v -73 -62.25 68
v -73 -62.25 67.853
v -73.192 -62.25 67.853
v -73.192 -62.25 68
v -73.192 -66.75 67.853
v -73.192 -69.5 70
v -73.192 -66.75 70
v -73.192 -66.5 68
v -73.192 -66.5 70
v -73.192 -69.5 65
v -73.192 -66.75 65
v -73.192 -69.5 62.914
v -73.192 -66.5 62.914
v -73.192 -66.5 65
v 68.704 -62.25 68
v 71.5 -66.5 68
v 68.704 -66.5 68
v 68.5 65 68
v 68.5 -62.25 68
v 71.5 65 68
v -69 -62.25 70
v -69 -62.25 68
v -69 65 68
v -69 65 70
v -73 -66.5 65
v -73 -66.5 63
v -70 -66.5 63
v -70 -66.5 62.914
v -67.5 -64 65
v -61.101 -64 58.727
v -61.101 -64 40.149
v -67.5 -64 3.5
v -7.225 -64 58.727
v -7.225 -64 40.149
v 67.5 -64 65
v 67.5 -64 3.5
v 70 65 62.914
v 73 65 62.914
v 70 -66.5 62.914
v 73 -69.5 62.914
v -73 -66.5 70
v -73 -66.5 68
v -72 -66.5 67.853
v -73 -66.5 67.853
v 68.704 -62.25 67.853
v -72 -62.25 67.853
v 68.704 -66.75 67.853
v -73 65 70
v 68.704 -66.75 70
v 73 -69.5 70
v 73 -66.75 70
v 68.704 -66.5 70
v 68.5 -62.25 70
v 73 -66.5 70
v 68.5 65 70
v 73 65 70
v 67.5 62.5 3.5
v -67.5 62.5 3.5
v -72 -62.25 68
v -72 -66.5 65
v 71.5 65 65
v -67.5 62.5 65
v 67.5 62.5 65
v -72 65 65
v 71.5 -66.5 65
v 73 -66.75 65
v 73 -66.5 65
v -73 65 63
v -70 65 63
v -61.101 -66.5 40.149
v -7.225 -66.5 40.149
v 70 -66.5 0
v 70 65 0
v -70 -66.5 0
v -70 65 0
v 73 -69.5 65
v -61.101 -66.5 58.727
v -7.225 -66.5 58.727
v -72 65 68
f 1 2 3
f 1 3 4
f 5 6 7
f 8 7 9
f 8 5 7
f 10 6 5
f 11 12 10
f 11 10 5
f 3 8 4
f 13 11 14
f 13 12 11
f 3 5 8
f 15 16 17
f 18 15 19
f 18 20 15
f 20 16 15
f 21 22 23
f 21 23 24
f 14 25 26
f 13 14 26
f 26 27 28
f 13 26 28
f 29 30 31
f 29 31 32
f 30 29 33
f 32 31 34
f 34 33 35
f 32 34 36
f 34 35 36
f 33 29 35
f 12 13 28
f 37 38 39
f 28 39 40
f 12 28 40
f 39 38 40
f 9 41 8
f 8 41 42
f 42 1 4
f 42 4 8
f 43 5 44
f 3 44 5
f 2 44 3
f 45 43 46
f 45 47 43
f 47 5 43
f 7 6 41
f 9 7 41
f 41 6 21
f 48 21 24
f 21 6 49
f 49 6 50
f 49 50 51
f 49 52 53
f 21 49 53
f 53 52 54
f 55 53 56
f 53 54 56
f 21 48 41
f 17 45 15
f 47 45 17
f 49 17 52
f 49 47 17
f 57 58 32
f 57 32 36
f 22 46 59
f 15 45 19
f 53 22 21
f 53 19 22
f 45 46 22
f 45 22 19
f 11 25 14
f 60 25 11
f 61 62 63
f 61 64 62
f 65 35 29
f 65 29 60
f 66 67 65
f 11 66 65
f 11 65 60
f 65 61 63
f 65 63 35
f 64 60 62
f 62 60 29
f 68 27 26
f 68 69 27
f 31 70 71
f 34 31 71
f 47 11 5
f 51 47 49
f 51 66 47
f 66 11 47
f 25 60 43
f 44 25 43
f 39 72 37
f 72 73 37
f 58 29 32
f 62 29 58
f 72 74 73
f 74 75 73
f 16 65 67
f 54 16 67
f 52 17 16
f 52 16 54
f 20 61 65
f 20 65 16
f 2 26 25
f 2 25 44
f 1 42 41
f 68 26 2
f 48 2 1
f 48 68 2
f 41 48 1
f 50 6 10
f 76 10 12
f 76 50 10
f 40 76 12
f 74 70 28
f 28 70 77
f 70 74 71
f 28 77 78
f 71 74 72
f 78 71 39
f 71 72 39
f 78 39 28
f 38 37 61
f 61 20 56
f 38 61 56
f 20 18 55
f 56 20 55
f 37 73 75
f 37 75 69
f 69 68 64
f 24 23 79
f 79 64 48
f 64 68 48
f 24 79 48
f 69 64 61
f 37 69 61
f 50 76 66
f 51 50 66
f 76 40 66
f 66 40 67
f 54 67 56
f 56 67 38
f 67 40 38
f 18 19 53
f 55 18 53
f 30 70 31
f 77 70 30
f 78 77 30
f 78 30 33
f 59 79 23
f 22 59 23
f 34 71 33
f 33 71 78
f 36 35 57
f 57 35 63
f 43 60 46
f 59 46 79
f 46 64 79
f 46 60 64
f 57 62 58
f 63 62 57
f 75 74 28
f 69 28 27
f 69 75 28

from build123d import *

# Parameters (mm, degrees)
F0_W      = 140
F0_H      = 130
F1_DEPTH  = 65
F2_W      = 138
F2_H      = 128
F3_DEPTH  = 63
F4_W      = 60
F4_H      = 20
F5_DEPTH  = 25
F7_W      = 130
F7_H      = 2.0862916112
F8_DEPTH  = 3
F9_W      = 1.5
F9_H      = 130
F10_DEPTH = 5
F11_W     = 130
F11_H     = 2
F12_DEPTH = 3
F13_W     = 130
F13_H     = 2
F14_DEPTH = 3
F15_W     = 1
F15_H     = 130
F16_DEPTH = 5
F17_W     = 130
F17_H     = 2
F18_DEPTH = 3
F19_DEPTH = 1.5
F20_DEPTH = 1.5
F21_DEPTH = 1.5
F22_DEPTH = 1.5
F23_DEPTH = 1.5
F25_DEPTH = 3
F26_W     = 80.1923086047
F26_H     = 2.75
F27_DEPTH = 5
F28_W     = 75.8964964747
F28_H     = 2.1470558643
F29_DEPTH = 4.5
F30_W     = 59.895
F30_H     = 4
F31_DEPTH = 3
F32_DEPTH = 62
F33_W     = 53.8761485368
F33_H     = 18.5779780149
F34_DEPTH = 3
F35_DEPTH = 4


with BuildPart() as f1:
    # F0 (on Top) → F1 (new body)
    with BuildSketch(Plane.XY):
        Rectangle(F0_W, F0_H)
    extrude(amount=F1_DEPTH)

    # F2 (on face) → F3 (cut)
    with BuildSketch(Plane.XY.offset(65)):
        Rectangle(F2_W, F2_H)
    extrude(amount=-F3_DEPTH, mode=Mode.SUBTRACT)

    # F4 (on face) → F5 (cut)
    with BuildSketch(Plane.XZ.offset(65)):
        with Locations((-37.1923086047, 55)):
            Rectangle(F4_W, F4_H)
    extrude(amount=-F5_DEPTH, mode=Mode.SUBTRACT)

    # F7 (on face) → F8 (join)
    with BuildSketch(Plane.YZ.offset(70)):
        with Locations((0, 63.9568541944)):
            Rectangle(F7_W, F7_H)
    extrude(amount=F8_DEPTH)

    # F9 (on face) → F10 (join)
    with BuildSketch(Plane.XY.offset(65)):
        with Locations((72.25, 0)):
            Rectangle(F9_W, F9_H)
    extrude(amount=F10_DEPTH)

    # F11 (on face) → F12 (join)
    with BuildSketch(Plane(origin=(71.5, 0, 0), x_dir=(0, -1, 0), z_dir=(-1, 0, 0))):
        with Locations((0, 69)):
            Rectangle(F11_W, F11_H)
    extrude(amount=F12_DEPTH)

    # F13 (on face) → F14 (join)
    with BuildSketch(Plane(origin=(-70, 0, 0), x_dir=(0, -1, 0), z_dir=(-1, 0, 0))):
        with Locations((0, 64)):
            Rectangle(F13_W, F13_H)
    extrude(amount=F14_DEPTH)

    # F15 (on face) → F16 (join)
    with BuildSketch(Plane.XY.offset(65)):
        with Locations((-72.5, 0)):
            Rectangle(F15_W, F15_H)
    extrude(amount=F16_DEPTH)

    # F17 (on face) → F18 (join)
    with BuildSketch(Plane.YZ.offset(-72)):
        with Locations((0, 69)):
            Rectangle(F17_W, F17_H)
    extrude(amount=F18_DEPTH)

    # F19 (add): a face of the model
    f19_faces = [f1.faces().sort_by_distance(p)[0] for p in [
        (5.6478539393, -65, 29.2570369854),
    ]]
    extrude(f19_faces, amount=F19_DEPTH)

    # F20 (add): a face of the model
    f20_faces = [f1.faces().sort_by_distance(p)[0] for p in [
        (0, 64, 33.5),
    ]]
    extrude(f20_faces, amount=F20_DEPTH)

    # F21 (add): a face of the model
    f21_faces = [f1.faces().sort_by_distance(p)[0] for p in [
        (-69, -0.75, 33.5),
    ]]
    extrude(f21_faces, amount=F21_DEPTH)

    # F22 (add): a face of the model
    f22_faces = [f1.faces().sort_by_distance(p)[0] for p in [
        (0.75, -0.75, 2),
    ]]
    extrude(f22_faces, amount=F22_DEPTH)

    # F23 (add): a face of the model
    f23_faces = [f1.faces().sort_by_distance(p)[0] for p in [
        (69, -0.75, 34.25),
    ]]
    extrude(f23_faces, amount=F23_DEPTH)

    # F24 (on face) → F25 (join)
    with BuildSketch(Plane.XZ.offset(66.5)):
        Polygon((70, 62.9137083888), (73, 62.9137083888), (73, 65), (71.5, 65), (-7.1923086047, 65), (-7.1923086047, 62.9137083888), align=None)
    extrude(amount=F25_DEPTH)

    # F26 (on face) → F27 (join)
    with BuildSketch(Plane.XY.offset(65)):
        with Locations((32.9038456976, -68.125)):
            Rectangle(F26_W, F26_H)
    extrude(amount=F27_DEPTH)

    # F28 (on face) → F29 (join)
    with BuildSketch(Plane(origin=(0, -66.75, 0), x_dir=(-1, 0, 0), z_dir=(0, 1, 0))):
        with Locations((-30.7559396327, 68.9264720678)):
            Rectangle(F28_W, F28_H)
    extrude(amount=F29_DEPTH)

    # F30 (on face) → F31 (cut)
    with BuildSketch(Plane.XZ.offset(66.5)):
        with Locations((-37.1398086047, 43)):
            Rectangle(F30_W, F30_H)
    extrude(amount=-F31_DEPTH, mode=Mode.SUBTRACT)

    # F32 (add): a face of the model
    f32_faces = [f1.faces().sort_by_distance(p)[0] for p in [
        (-7.1923086047, -65.8019850182, 57.704218208),
    ]]
    extrude(f32_faces, amount=F32_DEPTH)

    # F33 (on face) → F34 (cut)
    with BuildSketch(Plane.XZ.offset(66.5)):
        with Locations((-34.1628445312, 49.4380742311)):
            Rectangle(F33_W, F33_H)
    extrude(amount=-F34_DEPTH, mode=Mode.SUBTRACT)

    # F35 (add): a face of the model
    f35_faces = [f1.faces().sort_by_distance(p)[0] for p in [
        (-69.1923086047, -67.9393083677, 66.5012630043),
    ]]
    extrude(f35_faces, amount=F35_DEPTH)


solid = f1.part
